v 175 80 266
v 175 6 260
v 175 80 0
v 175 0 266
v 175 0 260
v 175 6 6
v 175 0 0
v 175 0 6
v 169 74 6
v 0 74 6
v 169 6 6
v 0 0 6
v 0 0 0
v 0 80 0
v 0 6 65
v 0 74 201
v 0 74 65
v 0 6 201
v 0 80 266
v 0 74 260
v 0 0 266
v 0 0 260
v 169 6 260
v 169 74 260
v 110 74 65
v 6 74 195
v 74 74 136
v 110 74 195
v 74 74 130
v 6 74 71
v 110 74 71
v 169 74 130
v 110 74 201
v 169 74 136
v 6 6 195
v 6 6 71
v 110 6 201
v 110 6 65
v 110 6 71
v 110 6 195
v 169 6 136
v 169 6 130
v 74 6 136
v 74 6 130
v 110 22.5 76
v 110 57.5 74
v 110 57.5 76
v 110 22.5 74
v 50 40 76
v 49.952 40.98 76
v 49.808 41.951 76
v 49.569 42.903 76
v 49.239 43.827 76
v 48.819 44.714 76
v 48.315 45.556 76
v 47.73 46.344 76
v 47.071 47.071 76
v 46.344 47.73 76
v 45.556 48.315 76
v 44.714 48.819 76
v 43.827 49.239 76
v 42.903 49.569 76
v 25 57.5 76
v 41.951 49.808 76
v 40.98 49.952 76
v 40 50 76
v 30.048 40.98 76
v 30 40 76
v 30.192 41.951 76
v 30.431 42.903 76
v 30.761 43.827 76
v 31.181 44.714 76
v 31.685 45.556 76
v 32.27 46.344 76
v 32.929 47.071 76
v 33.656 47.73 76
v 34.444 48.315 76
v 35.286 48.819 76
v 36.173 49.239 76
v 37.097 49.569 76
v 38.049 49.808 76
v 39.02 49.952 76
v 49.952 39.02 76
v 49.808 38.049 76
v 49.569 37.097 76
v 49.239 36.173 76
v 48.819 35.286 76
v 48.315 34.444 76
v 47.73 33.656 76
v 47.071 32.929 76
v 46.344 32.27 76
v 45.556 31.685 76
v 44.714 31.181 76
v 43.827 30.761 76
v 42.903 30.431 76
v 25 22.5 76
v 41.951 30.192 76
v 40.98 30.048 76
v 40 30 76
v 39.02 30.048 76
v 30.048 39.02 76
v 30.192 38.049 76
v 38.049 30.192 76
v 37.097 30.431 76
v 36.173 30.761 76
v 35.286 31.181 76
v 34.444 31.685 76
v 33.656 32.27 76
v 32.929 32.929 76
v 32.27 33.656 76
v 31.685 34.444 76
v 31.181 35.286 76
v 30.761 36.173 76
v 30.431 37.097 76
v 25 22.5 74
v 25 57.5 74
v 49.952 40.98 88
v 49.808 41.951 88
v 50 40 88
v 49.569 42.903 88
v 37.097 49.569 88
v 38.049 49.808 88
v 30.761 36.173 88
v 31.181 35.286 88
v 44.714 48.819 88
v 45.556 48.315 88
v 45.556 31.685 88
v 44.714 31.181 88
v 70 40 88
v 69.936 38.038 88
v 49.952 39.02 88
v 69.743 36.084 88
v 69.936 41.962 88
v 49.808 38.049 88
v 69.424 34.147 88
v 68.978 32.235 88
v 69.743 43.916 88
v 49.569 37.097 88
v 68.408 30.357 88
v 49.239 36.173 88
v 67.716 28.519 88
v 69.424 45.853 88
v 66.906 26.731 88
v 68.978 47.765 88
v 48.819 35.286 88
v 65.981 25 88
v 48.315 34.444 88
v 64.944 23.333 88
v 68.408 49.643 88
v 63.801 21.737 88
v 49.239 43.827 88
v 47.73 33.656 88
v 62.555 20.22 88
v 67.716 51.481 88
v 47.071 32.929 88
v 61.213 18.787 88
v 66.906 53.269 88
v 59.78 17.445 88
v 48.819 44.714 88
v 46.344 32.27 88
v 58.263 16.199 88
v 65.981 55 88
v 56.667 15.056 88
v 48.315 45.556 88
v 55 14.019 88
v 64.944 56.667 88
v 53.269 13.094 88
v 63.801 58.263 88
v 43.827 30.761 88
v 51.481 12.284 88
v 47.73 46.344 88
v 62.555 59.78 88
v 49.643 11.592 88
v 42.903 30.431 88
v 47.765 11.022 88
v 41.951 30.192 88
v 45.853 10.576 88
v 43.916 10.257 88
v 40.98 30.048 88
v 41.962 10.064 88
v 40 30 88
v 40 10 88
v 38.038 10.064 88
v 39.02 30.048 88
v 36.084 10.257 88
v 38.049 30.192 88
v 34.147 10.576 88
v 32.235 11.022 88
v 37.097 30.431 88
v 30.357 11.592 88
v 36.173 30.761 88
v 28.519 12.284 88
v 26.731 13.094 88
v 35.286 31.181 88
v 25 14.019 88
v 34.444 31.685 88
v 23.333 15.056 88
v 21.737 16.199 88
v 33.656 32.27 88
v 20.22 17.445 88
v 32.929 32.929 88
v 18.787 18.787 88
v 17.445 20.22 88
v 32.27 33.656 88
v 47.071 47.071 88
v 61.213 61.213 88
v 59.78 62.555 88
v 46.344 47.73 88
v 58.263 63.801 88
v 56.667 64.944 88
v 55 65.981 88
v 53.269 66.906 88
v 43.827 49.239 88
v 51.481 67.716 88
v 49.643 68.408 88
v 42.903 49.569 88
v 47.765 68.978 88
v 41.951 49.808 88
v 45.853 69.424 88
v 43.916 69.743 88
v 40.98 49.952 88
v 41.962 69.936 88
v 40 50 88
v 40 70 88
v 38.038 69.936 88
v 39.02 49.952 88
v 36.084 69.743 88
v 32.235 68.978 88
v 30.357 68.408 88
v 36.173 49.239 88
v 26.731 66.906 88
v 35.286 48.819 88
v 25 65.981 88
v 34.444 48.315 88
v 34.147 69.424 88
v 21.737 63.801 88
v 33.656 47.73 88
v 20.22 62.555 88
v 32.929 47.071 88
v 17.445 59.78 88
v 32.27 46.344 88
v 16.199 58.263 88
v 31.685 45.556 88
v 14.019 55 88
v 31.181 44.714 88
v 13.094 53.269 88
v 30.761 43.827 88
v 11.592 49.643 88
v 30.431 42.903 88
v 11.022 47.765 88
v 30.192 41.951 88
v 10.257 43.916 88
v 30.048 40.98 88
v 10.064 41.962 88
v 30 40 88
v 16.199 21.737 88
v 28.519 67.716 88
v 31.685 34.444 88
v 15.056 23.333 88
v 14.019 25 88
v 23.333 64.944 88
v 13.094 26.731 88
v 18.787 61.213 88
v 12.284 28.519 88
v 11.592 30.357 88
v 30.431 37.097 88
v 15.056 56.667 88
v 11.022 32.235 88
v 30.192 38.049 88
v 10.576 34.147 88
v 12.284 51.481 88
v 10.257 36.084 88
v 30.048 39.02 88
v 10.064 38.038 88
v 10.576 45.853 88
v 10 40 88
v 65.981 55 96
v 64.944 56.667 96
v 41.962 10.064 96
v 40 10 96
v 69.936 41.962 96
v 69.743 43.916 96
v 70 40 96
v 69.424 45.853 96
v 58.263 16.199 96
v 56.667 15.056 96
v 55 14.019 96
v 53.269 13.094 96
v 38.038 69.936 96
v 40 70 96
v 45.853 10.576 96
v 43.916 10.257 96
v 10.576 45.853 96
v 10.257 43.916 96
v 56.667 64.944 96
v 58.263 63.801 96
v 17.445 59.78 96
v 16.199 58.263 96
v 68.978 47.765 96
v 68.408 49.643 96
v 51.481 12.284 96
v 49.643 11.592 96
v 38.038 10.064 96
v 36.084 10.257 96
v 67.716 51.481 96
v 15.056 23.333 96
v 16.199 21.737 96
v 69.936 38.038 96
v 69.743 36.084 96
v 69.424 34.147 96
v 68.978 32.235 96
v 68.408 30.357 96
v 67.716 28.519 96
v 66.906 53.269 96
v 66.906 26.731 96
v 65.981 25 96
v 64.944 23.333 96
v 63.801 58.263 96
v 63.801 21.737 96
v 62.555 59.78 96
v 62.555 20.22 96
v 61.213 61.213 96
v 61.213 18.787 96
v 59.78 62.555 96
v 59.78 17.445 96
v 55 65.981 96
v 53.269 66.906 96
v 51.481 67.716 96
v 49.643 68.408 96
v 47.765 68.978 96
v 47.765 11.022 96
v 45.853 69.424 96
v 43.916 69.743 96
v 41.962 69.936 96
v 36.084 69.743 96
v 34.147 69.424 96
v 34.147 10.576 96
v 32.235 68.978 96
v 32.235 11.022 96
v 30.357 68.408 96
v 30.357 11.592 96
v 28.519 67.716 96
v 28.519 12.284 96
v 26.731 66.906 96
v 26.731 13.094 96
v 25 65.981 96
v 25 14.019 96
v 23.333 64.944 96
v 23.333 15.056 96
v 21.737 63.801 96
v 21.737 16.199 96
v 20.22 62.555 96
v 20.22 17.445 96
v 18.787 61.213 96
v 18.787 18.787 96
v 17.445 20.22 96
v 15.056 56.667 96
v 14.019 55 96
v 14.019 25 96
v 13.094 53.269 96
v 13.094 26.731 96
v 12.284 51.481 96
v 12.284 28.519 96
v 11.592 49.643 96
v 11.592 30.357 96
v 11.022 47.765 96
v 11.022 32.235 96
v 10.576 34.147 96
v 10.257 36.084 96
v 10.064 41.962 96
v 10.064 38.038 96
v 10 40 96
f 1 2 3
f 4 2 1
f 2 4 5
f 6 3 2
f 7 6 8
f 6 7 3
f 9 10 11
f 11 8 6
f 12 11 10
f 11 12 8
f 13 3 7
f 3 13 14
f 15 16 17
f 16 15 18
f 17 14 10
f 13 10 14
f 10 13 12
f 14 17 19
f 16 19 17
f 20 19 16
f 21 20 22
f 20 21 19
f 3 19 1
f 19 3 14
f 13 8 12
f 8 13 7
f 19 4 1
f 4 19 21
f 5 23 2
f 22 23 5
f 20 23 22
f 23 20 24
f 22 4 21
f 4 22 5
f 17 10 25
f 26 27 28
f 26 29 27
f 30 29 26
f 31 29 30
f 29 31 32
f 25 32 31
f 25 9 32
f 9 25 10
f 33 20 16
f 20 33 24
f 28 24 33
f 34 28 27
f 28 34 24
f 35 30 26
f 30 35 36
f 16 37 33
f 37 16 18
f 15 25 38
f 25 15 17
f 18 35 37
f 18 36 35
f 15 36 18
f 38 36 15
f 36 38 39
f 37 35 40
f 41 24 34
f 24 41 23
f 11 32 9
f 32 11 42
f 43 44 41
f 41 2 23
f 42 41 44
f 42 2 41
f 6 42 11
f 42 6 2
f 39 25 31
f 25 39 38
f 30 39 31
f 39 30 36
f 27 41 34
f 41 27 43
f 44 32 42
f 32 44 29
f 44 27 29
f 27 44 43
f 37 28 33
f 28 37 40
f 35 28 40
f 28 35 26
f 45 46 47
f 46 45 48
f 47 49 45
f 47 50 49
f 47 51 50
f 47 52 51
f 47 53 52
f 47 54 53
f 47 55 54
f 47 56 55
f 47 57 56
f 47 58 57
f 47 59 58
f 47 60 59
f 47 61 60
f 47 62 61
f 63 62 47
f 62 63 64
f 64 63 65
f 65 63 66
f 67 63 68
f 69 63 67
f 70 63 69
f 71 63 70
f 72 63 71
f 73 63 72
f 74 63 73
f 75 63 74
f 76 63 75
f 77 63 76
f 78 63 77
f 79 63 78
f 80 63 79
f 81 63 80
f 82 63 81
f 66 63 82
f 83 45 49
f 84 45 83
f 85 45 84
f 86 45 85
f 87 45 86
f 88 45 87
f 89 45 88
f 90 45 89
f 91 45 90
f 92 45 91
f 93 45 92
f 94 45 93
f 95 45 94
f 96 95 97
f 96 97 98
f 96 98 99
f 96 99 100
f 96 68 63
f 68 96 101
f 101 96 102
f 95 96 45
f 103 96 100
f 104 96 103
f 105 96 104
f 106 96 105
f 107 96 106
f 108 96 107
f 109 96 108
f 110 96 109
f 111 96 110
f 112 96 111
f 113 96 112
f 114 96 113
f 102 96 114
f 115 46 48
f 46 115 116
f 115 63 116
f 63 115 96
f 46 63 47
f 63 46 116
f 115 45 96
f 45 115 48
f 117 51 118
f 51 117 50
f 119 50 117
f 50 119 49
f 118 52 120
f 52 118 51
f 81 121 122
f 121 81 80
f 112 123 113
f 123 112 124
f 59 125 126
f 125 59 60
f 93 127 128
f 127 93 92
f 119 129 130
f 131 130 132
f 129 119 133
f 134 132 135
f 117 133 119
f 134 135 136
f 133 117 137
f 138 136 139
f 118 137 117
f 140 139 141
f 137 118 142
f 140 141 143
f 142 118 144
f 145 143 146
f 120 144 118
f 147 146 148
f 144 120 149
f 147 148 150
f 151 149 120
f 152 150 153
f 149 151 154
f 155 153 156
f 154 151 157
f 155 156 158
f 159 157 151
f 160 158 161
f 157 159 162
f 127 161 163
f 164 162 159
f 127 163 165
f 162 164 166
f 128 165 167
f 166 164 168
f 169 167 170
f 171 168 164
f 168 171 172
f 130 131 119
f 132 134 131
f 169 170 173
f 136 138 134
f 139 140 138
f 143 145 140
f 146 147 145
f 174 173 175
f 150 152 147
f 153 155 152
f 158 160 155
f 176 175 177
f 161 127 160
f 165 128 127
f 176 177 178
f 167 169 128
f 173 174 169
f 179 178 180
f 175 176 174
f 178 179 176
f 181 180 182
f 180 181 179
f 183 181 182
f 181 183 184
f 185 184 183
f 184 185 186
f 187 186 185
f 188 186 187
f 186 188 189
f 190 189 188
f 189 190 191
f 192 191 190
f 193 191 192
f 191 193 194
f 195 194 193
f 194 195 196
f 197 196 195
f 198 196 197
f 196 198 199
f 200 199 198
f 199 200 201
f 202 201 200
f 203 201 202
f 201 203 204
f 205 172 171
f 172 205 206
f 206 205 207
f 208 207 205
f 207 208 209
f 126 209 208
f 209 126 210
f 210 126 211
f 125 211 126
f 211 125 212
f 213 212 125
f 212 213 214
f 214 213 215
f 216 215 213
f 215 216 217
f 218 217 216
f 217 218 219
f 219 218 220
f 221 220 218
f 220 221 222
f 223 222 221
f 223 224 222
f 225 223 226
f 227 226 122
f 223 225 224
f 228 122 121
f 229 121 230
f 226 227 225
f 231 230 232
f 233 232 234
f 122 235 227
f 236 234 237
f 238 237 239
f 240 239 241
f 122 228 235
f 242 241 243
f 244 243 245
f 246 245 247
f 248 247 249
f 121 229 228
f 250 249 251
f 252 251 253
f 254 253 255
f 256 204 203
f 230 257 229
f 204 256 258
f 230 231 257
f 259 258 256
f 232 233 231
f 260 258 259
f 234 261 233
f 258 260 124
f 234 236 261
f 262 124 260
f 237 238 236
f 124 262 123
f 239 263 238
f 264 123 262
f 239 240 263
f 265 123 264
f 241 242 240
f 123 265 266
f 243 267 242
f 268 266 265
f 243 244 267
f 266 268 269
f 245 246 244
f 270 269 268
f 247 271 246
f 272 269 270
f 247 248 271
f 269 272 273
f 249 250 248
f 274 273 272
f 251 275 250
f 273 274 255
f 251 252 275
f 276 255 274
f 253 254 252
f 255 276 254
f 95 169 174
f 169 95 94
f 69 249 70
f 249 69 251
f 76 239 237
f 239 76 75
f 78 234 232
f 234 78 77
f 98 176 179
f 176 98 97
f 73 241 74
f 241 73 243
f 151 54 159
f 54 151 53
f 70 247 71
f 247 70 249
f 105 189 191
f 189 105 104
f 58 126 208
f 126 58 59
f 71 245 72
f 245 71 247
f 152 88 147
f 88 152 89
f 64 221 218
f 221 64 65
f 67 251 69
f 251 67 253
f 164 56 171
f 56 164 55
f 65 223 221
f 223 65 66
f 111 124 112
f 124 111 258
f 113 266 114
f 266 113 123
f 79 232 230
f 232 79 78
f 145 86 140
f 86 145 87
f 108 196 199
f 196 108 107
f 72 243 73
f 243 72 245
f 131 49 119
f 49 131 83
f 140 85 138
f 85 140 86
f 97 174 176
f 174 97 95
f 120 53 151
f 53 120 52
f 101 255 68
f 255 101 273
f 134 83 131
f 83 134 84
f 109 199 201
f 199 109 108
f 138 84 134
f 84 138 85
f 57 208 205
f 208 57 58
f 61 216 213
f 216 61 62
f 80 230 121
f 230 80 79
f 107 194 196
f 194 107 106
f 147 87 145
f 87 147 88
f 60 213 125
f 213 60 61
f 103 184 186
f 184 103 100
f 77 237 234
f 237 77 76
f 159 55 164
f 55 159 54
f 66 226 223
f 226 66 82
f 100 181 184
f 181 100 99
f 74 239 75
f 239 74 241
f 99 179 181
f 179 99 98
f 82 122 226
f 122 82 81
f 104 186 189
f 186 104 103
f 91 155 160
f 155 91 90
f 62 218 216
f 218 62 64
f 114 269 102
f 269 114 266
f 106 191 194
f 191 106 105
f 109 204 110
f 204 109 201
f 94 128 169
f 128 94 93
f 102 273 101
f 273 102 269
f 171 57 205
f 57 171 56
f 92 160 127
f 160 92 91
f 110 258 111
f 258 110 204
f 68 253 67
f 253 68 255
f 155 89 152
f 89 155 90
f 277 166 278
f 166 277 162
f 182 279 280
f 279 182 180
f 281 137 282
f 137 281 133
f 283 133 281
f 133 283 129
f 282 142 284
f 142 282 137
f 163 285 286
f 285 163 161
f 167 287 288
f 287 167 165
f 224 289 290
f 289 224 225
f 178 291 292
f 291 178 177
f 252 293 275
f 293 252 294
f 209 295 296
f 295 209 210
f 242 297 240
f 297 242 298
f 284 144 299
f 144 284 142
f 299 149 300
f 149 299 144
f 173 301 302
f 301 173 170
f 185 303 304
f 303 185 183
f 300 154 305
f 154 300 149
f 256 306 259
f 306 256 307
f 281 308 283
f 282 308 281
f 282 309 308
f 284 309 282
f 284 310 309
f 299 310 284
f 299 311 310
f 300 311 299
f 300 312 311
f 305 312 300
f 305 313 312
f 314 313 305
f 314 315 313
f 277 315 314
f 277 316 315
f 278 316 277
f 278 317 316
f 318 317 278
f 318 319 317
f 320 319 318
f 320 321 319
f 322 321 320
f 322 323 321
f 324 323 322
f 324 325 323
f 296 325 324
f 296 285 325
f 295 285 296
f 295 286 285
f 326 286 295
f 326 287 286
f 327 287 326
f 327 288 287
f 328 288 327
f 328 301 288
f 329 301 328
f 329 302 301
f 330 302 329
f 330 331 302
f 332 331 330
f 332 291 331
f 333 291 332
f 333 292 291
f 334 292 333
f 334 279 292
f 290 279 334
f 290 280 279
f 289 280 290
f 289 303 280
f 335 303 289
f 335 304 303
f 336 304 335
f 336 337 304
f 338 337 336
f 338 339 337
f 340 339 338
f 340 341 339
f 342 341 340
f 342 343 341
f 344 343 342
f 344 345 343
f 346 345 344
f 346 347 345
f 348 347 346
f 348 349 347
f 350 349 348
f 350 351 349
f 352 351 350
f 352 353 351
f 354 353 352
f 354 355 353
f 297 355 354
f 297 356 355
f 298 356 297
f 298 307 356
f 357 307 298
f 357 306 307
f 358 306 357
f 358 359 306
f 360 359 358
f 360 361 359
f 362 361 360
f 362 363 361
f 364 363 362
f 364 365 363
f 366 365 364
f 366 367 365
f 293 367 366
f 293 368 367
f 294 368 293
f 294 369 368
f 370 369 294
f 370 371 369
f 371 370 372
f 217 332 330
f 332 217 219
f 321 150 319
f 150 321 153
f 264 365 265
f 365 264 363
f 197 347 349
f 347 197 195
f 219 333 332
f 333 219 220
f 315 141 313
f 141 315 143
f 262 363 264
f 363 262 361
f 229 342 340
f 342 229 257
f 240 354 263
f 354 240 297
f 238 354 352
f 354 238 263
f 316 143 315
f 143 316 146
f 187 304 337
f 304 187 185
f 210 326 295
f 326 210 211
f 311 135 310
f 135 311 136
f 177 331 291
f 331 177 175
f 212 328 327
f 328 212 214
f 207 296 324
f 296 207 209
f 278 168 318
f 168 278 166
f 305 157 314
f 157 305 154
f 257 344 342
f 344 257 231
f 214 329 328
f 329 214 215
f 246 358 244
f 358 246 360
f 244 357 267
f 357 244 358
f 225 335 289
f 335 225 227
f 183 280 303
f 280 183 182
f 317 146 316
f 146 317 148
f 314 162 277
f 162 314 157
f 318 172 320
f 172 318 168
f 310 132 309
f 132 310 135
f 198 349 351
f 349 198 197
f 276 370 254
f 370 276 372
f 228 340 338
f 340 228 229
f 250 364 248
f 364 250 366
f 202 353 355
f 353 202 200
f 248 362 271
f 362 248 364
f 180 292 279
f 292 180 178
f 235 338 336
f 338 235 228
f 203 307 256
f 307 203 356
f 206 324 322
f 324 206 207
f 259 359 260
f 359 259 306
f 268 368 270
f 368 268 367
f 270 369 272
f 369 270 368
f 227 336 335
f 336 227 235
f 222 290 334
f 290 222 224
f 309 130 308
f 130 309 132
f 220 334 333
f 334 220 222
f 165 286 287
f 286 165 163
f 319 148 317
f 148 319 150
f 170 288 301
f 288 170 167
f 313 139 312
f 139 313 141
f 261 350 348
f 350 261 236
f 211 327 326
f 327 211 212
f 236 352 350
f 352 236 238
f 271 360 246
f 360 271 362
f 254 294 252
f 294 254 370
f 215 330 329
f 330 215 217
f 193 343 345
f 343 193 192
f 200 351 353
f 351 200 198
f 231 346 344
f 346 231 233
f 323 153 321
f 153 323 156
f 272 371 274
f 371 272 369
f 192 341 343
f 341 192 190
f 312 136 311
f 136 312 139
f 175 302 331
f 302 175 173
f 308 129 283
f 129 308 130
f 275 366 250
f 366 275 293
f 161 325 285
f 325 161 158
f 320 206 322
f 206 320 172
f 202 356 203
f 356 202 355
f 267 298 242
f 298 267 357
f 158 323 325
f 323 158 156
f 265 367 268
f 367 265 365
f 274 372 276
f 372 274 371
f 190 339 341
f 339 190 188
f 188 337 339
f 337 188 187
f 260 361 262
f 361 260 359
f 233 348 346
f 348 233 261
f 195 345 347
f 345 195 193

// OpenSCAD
// Layered plywood airflow box built from rectangular panels.
// All dimensions are in millimeters.

box_length = 175;
box_width  = 80;
thickness  = 6;

inner_length = box_length - 2 * thickness;
inner_width = box_width - 2 * thickness;

minimum_passage_area = 4000; // 40 cm^2
passage_size = ceil(minimum_passage_area / inner_width);
passage_area = inner_width * passage_size; // 68 mm * 59 mm = 40.12 cm^2
propeller_window_length = 68;
propeller_window_area = inner_width * propeller_window_length; // 46.24 cm^2

second_floor_z = thickness + passage_size;
second_floor_length = inner_length - passage_size;

middle_passage_height = passage_size;
third_floor_z = second_floor_z + thickness + middle_passage_height;
third_floor_length = inner_length - propeller_window_length;

upper_passage_height = passage_size;
fourth_floor_z = third_floor_z + thickness + upper_passage_height;
fourth_floor_length = inner_length - passage_size;

top_passage_height = passage_size;
box_height = fourth_floor_z + thickness + top_passage_height;

pcb_length = 85;
pcb_width = 35;
pcb_thickness = 2;
pcb_standoff = 3;
cylinder_diameter = 20;
cylinder_height = 12;
cylinder_end_offset = 15;
propeller_diameter = 60;
propeller_height = 8;

// Center the propeller in the 68 mm square opening.
pcb_x = thickness
    + propeller_window_length / 2
    - cylinder_end_offset;
pcb_y = thickness + (inner_width - pcb_width) / 2;

// Set above zero for an exploded view.
explode = 0;

module bottom_panel() {
    translate([0, 0, -explode])
        cube([box_length, box_width, thickness]);
}

module top_panel() {
    translate([0, 0, box_height + explode])
        cube([box_length, box_width, thickness]);
}

// Long side at y = 0.
module left_panel() {
    translate([0, -explode, thickness])
        cube([
            box_length,
            thickness,
            box_height - thickness
        ]);
}

// Long side at y = box_width.
module right_panel() {
    translate([
        0,
        box_width - thickness + explode,
        thickness
    ])
        cube([
            box_length,
            thickness,
            box_height - thickness
        ]);
}

// Short end at x = 0.
module front_panel() {
    translate([
        -explode,
        thickness,
        second_floor_z
    ])
        cube([
            thickness,
            inner_width,
            fourth_floor_z + thickness - second_floor_z
        ]);
}

// Short end at x = box_length.
module back_panel() {
    translate([
        box_length - thickness + explode,
        thickness,
        thickness
    ])
        cube([
            thickness,
            inner_width,
            box_height - thickness
        ]);
}

module second_floor_panel() {
    translate([
        thickness,
        thickness,
        second_floor_z + explode
    ])
        cube([
            second_floor_length,
            inner_width,
            thickness
        ]);
}

module third_floor_panel() {
    translate([
        thickness + propeller_window_length,
        thickness,
        third_floor_z + explode
    ])
        cube([
            third_floor_length,
            inner_width,
            thickness
        ]);
}

module fourth_floor_panel() {
    translate([
        thickness,
        thickness,
        fourth_floor_z + explode
    ])
        cube([
            fourth_floor_length,
            inner_width,
            thickness
        ]);
}

module mock_pcb() {
    translate([
        pcb_x,
        pcb_y,
        second_floor_z + thickness + pcb_standoff + explode
    ])
        cube([
            pcb_length,
            pcb_width,
            pcb_thickness
        ]);
}

module mock_cylinder() {
    translate([
        pcb_x + cylinder_end_offset,
        pcb_y + pcb_width / 2,
        second_floor_z + thickness + pcb_standoff + pcb_thickness + explode
    ])
        cylinder(
            h = cylinder_height,
            d = cylinder_diameter,
            $fn = 64
        );
}

module mock_propeller() {
    translate([
        pcb_x + cylinder_end_offset,
        pcb_y + pcb_width / 2,
        second_floor_z
            + thickness
            + pcb_standoff
            + pcb_thickness
            + cylinder_height
            + explode
    ])
        cylinder(
            h = propeller_height,
            d = propeller_diameter,
            $fn = 96
        );
}

color("BurlyWood") {
    bottom_panel();
    top_panel();
    //left_panel();
    right_panel();
    front_panel();
    back_panel();
    second_floor_panel();
    third_floor_panel();
    fourth_floor_panel();
}

color("ForestGreen")
    mock_pcb();

color("Black")
    mock_cylinder();

// Alpha 0.8 means 20% transparent.
color([0.7, 0.7, 0.7, 0.8])
    mock_propeller();
